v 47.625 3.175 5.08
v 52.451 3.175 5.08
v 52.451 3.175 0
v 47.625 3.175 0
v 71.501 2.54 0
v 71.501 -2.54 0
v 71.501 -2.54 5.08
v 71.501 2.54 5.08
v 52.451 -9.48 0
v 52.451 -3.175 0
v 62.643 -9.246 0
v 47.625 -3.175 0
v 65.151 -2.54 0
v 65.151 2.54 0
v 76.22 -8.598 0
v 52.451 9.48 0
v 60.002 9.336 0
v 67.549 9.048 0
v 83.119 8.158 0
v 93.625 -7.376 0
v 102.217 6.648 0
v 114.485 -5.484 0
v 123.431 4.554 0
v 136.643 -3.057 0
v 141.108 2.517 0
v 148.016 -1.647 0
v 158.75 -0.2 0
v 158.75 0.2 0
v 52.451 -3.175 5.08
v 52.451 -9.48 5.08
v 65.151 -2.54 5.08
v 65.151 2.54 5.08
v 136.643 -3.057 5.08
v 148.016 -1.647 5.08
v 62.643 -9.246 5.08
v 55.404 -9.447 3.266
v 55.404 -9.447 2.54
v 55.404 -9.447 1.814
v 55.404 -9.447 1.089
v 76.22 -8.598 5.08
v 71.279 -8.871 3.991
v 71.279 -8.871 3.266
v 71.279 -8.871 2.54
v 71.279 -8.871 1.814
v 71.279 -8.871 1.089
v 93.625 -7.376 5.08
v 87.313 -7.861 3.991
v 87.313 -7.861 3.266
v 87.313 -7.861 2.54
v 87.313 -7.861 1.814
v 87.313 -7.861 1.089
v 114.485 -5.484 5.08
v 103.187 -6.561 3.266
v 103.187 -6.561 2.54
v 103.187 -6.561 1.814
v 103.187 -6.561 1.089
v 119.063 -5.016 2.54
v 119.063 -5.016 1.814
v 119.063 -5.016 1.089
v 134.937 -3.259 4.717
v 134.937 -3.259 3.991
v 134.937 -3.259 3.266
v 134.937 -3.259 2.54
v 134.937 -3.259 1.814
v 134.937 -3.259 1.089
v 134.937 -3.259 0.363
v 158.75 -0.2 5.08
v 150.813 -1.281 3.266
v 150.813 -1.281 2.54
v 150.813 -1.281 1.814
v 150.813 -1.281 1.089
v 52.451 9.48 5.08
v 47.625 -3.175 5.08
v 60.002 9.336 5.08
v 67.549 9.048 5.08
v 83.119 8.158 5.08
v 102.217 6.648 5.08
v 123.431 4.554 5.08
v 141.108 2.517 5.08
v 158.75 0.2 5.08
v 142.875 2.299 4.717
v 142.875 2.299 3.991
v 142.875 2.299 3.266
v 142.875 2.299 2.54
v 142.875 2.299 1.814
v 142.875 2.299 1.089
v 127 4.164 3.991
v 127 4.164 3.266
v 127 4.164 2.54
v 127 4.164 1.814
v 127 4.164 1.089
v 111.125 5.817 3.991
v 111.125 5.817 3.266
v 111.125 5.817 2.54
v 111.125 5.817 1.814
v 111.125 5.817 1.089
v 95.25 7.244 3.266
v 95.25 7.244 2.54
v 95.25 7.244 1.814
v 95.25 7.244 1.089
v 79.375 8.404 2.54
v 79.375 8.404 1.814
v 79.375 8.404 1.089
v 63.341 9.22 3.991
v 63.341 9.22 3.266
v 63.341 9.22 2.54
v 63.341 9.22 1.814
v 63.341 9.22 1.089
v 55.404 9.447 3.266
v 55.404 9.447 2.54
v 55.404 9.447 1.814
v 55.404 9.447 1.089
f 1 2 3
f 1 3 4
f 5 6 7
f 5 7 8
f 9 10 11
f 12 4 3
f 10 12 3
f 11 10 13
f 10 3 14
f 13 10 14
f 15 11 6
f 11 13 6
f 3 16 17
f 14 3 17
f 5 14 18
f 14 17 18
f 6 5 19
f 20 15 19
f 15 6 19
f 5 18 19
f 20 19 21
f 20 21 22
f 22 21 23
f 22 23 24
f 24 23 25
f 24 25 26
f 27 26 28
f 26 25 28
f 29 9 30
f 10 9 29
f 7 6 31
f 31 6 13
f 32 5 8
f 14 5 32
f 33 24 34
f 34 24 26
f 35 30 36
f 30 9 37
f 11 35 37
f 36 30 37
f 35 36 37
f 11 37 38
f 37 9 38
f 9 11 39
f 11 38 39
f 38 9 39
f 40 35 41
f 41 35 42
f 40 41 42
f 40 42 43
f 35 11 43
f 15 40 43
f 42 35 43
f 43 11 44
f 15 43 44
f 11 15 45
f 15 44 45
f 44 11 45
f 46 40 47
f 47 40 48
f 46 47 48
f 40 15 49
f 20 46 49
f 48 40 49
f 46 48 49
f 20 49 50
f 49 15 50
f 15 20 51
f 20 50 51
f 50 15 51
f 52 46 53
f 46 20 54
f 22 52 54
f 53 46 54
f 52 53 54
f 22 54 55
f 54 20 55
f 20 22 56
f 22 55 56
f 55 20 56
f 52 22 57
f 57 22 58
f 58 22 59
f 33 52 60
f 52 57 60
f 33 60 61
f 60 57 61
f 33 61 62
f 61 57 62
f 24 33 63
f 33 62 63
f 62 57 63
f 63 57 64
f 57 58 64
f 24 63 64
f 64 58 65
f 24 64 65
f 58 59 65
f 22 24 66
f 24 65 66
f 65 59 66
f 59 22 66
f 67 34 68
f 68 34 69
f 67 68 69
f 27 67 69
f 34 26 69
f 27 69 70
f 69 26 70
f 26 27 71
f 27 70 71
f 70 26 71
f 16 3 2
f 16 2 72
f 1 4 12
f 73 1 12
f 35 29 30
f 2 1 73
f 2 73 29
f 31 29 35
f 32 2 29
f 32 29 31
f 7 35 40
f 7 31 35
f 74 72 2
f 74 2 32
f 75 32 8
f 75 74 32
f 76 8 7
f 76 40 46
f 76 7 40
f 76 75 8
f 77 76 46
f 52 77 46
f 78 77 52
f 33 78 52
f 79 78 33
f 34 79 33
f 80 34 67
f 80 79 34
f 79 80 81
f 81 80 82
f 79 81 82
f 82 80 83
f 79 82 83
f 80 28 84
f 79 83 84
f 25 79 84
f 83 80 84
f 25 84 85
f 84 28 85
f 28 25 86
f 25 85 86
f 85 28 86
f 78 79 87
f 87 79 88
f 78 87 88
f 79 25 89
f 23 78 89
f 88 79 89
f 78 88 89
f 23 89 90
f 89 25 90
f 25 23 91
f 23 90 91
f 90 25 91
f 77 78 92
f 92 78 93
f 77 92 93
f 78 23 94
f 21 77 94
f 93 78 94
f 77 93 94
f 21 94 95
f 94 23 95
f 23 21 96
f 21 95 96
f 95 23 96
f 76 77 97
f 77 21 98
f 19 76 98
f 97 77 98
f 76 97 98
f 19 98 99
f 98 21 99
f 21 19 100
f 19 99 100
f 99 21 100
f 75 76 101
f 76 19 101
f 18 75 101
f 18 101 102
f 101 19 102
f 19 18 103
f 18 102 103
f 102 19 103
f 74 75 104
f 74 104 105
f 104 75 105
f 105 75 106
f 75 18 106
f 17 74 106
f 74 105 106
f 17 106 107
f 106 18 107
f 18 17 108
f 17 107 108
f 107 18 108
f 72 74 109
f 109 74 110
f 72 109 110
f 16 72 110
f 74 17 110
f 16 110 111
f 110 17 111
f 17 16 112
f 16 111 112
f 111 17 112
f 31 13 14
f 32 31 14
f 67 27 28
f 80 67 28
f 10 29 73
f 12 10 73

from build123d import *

# Parameters (mm, degrees)
BOSS_EXTRUDE1_DEPTH = 5.08
SKETCH3_W           = 4.826
SKETCH3_H           = 6.35076331
SKETCH3_W_2         = 6.35
SKETCH3_H_2         = 5.08
CUT_EXTRUDE1_DEPTH  = 6.0800001


with BuildPart() as part:
    # Sketch2 → Boss-Extrude1 (new body)
    with BuildSketch(Plane.XY):
        with BuildLine():
            Line((158.75, -0.200025), (158.75, 0.200025))
            add(Edge.make_bspline(
                [(158.75, 0.200025), (156.104769639, 0.564899501), (150.817056987, 1.294269442), (142.878358215, 2.306719234), (134.940769513, 3.268408227), (127.002836924, 4.172206586), (119.065195908, 5.02492376), (111.127662782, 5.825402282), (103.190287717, 6.571495389), (95.252619427, 7.253962327), (87.315238521, 7.873917198), (79.324754405, 8.420599463), (71.334509538, 8.88842609), (63.343416227, 9.23480821), (55.458296632, 9.48903948), (50.217735657, 9.487192482), (47.625, 9.52576331)],
                knots=[0, 0, 0, 0, 0.024634231, 0.04924287, 0.07382978, 0.098396751, 0.122945996, 0.147478562, 0.171994581, 0.196493552, 0.220976186, 0.245442093, 0.270380478, 0.294812969, 0.319231823, 0.343153728, 0.343153728, 0.343153728, 0.343153728], degree=3))
            Line((47.625, 9.52576331), (47.625, -9.52576331))
            add(Edge.make_bspline(
                [(47.625, -9.52576331), (50.217735657, -9.487192482), (55.458296632, -9.48903948), (63.343416227, -9.23480821), (71.334509538, -8.88842609), (79.324754405, -8.420599463), (87.315238521, -7.873917198), (95.252619427, -7.253962327), (103.190287717, -6.571495389), (111.127662782, -5.825402282), (119.065195908, -5.02492376), (127.002836924, -4.172206586), (134.940769513, -3.268408227), (142.878358215, -2.306719234), (150.817056987, -1.294269442), (156.104769639, -0.564899501), (158.75, -0.200025)],
                knots=[0.656846272, 0.656846272, 0.656846272, 0.656846272, 0.680768177, 0.705187031, 0.729619522, 0.754557907, 0.779023814, 0.803506448, 0.828005419, 0.852521438, 0.877054004, 0.901603249, 0.92617022, 0.95075713, 0.975365769, 1, 1, 1, 1], degree=3))
        make_face()
    extrude(amount=BOSS_EXTRUDE1_DEPTH)

    # Sketch3 → Cut-Extrude1 (cut, through all)
    with BuildSketch(Plane(origin=(0, 0, 0), x_dir=(-1, 0, 0), z_dir=(0, 0, -1))):
        with Locations((-50.038, -6.350381655)):
            Rectangle(SKETCH3_W, SKETCH3_H)
        with Locations((-50.038, 6.350381655)):
            Rectangle(SKETCH3_W, SKETCH3_H)
        with Locations((-68.326, 0)):
            Rectangle(SKETCH3_W_2, SKETCH3_H_2)
    extrude(amount=-CUT_EXTRUDE1_DEPTH, mode=Mode.SUBTRACT)


solid = part.part
